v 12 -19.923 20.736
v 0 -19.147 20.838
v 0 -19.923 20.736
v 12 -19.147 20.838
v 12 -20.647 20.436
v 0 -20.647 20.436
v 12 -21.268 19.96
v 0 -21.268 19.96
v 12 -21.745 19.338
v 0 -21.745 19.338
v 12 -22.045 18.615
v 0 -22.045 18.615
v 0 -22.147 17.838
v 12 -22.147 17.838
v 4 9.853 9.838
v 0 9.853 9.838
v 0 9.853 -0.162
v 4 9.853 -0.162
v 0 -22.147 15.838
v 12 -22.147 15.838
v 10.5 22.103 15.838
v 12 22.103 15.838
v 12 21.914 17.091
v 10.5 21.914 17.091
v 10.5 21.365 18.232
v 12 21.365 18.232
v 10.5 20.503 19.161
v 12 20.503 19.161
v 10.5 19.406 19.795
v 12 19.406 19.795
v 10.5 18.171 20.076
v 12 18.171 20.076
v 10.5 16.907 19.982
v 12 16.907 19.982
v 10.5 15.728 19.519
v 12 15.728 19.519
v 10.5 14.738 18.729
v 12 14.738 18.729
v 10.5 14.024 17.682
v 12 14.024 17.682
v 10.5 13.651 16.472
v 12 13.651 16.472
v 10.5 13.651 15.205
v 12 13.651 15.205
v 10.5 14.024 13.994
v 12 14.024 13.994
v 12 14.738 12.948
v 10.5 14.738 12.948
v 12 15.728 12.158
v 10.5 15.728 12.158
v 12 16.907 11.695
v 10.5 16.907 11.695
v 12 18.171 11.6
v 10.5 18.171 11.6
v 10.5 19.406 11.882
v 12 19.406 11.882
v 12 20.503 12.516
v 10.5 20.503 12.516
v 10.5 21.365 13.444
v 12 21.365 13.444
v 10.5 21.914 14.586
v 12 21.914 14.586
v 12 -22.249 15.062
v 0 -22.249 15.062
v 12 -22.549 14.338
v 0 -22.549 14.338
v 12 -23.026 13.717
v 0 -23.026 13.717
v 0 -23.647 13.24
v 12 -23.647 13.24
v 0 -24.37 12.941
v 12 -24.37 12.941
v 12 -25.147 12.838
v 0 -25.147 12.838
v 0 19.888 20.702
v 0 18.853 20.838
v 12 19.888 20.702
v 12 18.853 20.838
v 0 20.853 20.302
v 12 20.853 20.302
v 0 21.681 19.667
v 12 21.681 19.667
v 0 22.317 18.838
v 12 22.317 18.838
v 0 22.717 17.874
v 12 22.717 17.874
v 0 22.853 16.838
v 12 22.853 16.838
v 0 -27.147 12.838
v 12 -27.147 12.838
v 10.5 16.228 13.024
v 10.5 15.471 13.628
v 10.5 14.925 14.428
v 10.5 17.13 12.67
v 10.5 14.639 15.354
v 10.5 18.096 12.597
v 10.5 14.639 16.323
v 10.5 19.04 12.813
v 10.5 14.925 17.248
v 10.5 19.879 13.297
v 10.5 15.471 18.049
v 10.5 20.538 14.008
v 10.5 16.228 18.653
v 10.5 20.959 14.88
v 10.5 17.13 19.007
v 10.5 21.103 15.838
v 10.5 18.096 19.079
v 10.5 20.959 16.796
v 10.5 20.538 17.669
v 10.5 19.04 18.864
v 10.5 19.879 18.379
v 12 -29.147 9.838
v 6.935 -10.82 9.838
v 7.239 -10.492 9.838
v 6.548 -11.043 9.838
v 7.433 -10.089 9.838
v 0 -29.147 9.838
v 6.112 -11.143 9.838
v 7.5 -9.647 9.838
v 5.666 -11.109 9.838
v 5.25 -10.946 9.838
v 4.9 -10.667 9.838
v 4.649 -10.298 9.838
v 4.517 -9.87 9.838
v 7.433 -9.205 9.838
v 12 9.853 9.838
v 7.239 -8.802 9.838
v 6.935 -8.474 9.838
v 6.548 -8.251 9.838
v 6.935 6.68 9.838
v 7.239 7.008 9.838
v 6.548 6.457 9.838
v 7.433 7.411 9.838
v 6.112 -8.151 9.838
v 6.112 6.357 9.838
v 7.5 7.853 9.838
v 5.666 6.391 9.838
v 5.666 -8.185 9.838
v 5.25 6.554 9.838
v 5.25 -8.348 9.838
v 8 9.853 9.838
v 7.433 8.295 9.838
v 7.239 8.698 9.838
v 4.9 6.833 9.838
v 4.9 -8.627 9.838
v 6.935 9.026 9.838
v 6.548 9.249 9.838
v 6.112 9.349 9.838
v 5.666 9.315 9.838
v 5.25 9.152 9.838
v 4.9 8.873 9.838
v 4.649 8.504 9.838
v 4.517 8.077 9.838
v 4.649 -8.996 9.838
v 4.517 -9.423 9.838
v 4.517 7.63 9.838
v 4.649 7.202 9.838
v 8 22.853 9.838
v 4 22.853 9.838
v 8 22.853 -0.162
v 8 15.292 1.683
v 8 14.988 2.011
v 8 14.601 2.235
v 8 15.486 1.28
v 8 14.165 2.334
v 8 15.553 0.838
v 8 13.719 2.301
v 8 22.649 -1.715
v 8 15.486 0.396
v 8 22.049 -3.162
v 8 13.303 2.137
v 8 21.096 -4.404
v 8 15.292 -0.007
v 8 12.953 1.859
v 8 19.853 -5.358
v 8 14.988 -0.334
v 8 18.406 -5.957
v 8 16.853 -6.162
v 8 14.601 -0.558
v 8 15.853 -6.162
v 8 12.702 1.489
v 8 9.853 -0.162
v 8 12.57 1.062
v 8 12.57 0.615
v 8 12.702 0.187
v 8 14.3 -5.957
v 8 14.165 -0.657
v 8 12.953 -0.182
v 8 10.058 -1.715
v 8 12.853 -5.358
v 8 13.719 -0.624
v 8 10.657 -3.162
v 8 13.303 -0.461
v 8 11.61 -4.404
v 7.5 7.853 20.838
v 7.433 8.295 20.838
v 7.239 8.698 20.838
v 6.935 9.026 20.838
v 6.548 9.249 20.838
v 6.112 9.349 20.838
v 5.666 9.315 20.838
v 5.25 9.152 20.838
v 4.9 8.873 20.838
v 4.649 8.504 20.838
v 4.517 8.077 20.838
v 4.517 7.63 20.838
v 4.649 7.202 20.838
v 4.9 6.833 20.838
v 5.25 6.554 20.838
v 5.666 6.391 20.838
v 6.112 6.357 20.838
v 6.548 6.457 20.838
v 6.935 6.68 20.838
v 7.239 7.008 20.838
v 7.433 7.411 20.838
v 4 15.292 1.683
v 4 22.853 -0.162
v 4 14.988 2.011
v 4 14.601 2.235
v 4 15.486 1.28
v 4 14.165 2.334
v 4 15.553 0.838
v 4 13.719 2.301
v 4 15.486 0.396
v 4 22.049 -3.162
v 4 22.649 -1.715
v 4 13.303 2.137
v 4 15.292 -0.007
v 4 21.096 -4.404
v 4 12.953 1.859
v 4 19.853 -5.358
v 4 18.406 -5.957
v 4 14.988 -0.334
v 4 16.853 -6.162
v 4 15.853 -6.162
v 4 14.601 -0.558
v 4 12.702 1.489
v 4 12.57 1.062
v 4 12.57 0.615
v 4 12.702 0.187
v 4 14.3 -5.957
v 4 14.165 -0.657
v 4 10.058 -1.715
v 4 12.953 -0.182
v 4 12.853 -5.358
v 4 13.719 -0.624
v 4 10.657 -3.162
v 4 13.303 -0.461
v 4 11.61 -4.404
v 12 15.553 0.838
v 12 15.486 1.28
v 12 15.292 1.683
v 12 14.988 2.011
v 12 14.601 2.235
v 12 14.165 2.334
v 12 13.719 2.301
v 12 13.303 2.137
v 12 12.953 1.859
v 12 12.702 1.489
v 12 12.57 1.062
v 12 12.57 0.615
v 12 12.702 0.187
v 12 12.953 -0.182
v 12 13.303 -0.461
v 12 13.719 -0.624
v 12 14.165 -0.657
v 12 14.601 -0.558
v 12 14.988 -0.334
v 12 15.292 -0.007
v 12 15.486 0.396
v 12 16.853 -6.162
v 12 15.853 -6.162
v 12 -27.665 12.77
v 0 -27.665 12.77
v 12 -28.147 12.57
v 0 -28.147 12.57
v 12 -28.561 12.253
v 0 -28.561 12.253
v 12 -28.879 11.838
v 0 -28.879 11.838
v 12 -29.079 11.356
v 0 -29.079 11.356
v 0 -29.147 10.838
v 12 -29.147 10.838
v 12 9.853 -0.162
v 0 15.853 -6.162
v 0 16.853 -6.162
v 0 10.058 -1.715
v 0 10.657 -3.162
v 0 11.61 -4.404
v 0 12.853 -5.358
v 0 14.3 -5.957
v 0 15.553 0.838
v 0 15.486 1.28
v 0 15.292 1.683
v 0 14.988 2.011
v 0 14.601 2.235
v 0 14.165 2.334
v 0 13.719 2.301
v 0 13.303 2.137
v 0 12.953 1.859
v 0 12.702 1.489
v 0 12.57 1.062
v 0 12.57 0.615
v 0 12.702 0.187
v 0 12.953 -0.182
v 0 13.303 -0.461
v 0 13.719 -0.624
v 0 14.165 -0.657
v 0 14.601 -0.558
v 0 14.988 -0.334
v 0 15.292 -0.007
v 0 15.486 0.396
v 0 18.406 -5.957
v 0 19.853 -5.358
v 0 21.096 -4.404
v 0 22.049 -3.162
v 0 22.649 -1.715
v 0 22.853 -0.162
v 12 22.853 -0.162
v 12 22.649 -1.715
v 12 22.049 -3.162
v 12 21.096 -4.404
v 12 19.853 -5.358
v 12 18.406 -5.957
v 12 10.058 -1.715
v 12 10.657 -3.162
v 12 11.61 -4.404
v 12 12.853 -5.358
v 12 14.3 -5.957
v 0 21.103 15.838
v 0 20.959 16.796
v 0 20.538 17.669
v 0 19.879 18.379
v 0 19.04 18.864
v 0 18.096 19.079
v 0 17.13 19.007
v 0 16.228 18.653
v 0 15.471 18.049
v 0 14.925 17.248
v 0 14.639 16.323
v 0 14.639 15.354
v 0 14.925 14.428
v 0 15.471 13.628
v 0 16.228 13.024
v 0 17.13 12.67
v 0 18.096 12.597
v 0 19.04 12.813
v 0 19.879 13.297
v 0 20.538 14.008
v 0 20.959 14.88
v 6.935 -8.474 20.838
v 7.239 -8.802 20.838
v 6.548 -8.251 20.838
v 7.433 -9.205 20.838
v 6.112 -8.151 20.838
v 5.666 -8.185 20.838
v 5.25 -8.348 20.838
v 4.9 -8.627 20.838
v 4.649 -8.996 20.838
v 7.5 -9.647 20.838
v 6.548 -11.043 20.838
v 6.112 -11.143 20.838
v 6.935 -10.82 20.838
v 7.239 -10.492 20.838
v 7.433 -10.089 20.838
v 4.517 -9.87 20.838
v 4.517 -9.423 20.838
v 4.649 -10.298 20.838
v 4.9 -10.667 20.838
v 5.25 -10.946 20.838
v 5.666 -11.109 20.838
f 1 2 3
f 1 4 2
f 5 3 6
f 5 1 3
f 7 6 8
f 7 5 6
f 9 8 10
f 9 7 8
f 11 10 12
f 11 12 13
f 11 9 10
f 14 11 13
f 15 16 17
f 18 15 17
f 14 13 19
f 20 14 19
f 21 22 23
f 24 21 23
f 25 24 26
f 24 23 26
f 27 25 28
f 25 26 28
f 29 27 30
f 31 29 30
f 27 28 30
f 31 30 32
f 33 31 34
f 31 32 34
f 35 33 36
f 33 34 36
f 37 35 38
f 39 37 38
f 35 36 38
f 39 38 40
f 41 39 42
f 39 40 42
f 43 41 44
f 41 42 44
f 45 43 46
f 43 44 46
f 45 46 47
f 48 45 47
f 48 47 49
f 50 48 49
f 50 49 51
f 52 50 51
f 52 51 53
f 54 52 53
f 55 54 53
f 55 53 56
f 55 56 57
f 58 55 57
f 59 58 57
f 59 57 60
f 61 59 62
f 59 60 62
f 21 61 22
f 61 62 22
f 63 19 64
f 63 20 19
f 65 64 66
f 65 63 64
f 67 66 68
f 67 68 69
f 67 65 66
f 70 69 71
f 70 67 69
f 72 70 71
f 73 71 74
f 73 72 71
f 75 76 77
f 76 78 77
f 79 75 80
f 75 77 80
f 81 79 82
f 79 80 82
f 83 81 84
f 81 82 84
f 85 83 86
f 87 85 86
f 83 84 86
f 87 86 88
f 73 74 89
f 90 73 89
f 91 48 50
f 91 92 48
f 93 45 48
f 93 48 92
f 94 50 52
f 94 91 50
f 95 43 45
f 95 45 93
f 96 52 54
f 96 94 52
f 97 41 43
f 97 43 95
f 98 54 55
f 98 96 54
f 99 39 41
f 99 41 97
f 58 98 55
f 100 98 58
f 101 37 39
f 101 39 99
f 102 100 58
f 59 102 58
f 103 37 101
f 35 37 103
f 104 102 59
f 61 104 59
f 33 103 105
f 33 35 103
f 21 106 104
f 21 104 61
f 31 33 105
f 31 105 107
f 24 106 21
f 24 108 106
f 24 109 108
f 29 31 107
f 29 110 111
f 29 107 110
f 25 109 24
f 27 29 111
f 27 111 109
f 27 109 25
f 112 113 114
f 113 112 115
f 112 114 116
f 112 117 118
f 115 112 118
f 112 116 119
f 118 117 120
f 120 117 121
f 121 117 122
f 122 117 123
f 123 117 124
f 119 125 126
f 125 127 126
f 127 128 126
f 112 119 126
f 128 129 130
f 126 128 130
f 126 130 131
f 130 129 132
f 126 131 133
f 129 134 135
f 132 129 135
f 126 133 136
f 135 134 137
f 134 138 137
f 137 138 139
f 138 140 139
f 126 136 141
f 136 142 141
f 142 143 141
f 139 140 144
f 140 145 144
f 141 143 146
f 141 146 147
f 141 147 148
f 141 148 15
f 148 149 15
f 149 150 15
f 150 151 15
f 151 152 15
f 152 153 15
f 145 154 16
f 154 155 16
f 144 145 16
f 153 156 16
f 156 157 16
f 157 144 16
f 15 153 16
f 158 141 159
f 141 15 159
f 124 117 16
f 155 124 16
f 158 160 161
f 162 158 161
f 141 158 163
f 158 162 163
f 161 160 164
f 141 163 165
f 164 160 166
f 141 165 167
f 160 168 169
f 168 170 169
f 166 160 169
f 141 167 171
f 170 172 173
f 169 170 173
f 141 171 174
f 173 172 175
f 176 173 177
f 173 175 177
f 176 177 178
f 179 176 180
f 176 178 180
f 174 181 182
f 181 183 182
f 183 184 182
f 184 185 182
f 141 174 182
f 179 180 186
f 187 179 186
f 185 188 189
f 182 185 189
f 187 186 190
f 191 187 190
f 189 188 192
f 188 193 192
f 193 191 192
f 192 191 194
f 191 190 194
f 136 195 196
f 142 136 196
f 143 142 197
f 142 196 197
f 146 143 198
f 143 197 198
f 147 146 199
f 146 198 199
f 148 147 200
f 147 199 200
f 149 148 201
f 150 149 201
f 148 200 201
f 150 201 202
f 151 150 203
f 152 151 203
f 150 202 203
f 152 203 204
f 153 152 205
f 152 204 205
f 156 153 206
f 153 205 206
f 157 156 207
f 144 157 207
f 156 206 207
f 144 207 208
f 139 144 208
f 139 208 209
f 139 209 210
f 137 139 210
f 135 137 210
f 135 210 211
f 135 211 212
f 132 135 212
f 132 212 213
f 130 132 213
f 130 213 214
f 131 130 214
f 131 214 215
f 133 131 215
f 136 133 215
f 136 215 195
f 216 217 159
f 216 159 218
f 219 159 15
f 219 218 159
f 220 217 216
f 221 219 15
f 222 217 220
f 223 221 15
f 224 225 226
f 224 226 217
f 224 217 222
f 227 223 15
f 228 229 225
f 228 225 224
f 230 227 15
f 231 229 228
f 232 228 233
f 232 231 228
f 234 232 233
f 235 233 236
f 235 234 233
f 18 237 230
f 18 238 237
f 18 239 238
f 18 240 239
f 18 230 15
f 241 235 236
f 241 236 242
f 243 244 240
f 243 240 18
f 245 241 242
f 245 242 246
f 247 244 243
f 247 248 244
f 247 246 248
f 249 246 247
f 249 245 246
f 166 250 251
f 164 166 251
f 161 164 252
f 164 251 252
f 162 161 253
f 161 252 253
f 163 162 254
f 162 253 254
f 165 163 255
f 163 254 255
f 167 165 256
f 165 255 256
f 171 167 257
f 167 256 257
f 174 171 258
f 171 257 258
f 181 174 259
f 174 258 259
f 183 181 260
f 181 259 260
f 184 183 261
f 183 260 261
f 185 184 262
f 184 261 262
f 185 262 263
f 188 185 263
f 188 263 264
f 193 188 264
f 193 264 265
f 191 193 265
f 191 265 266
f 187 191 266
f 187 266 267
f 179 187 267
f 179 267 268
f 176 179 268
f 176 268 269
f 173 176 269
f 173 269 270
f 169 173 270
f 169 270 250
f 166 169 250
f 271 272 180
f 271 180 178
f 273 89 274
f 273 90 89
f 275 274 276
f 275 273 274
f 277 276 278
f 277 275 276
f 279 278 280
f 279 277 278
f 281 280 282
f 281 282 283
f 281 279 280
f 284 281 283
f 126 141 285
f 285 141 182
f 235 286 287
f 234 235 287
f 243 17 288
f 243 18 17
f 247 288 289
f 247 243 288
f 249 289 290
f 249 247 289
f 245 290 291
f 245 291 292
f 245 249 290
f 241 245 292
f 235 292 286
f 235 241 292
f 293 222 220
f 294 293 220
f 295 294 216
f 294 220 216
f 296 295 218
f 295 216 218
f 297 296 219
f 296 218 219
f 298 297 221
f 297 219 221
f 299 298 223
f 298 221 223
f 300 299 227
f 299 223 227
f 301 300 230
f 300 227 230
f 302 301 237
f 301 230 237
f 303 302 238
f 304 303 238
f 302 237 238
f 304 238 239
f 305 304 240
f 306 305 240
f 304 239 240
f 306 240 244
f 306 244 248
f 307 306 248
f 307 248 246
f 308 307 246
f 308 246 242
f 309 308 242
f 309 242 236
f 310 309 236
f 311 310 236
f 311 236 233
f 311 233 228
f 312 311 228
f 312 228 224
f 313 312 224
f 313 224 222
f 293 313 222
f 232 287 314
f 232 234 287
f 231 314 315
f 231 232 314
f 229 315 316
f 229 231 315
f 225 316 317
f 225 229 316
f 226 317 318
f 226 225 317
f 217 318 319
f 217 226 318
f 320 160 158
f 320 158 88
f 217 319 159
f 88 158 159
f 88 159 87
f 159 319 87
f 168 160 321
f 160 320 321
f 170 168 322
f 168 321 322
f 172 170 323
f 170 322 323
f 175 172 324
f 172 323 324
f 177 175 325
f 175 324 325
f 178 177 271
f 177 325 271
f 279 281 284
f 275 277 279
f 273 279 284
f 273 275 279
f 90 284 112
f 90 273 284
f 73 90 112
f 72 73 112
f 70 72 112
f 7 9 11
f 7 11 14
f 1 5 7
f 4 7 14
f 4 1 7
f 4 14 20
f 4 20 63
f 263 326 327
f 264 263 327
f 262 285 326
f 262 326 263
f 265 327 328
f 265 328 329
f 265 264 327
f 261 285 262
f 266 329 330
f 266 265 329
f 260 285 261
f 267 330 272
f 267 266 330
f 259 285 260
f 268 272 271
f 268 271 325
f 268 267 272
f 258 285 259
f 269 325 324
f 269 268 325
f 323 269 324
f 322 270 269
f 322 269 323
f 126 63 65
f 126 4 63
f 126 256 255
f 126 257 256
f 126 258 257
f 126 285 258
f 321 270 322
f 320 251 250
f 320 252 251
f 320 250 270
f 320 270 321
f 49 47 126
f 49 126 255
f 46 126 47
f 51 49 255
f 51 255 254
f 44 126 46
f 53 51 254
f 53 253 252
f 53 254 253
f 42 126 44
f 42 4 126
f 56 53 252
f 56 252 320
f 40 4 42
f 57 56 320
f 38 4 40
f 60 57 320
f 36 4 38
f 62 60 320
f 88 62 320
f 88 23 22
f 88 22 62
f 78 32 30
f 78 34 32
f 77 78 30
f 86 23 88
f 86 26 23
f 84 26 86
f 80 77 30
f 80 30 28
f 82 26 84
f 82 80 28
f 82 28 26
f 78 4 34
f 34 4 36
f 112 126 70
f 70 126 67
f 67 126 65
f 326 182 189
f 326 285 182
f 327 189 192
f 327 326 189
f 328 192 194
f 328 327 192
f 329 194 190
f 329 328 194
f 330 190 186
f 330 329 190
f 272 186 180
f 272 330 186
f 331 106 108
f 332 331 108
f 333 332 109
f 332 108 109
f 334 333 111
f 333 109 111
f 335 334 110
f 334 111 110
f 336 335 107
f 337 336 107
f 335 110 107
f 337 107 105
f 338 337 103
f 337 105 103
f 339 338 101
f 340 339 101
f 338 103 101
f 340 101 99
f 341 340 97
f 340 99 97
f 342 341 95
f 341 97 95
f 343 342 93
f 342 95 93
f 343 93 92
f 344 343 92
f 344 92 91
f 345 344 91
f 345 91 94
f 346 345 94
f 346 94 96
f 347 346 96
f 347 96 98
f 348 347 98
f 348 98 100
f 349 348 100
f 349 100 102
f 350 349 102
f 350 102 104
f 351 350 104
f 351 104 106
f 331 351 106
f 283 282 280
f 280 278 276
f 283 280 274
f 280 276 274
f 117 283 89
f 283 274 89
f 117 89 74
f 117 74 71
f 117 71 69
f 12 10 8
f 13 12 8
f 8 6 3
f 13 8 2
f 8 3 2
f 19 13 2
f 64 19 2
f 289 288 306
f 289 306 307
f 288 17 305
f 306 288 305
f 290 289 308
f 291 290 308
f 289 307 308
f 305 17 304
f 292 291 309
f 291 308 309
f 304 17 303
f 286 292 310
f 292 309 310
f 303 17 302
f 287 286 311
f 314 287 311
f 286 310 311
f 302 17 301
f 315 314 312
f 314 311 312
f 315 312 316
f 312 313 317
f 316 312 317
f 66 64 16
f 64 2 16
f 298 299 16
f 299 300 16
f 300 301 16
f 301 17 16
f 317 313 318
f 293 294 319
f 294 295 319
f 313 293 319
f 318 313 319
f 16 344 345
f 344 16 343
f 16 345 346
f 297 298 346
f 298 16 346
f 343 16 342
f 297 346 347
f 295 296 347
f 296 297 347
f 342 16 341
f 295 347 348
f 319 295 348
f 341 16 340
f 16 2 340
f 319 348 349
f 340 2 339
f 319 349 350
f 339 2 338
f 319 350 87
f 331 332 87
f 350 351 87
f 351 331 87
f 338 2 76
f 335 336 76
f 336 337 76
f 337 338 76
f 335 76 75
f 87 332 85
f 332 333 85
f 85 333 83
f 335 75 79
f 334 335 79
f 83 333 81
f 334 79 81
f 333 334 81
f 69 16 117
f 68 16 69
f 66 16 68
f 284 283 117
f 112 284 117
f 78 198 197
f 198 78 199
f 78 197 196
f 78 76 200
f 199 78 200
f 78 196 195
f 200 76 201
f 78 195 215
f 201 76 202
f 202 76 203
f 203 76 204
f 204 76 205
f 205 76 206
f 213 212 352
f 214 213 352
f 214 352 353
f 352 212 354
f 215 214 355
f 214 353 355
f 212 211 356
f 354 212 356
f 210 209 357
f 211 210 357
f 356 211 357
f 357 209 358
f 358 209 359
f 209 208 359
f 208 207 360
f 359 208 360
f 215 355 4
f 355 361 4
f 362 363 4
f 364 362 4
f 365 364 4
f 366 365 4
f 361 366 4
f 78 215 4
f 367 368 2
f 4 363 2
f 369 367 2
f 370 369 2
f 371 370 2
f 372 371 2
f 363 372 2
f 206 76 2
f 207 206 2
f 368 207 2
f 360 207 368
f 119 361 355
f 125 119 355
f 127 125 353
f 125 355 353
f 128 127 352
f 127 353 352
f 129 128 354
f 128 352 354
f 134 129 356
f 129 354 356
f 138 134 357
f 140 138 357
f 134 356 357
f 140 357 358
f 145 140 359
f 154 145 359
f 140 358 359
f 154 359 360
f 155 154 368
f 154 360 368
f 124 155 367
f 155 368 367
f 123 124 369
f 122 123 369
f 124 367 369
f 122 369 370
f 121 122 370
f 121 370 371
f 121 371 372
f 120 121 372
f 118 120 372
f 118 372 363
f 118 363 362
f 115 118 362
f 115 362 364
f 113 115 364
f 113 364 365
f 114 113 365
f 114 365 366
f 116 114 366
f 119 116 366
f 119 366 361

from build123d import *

# Parameters (mm, degrees)
F1_DEPTH  = 12
F2_R      = 3.25
F3_DEPTH  = 12.001
F5_R      = 4.25
F6_DEPTH  = 1.5
F4_R      = 1.5
F7_DEPTH  = 27.001
F8_R      = 4
F9_R      = 3
F10_R     = 2
F11_R     = 1.5
F12_DEPTH = 12.001
F13_W     = 4
F13_H     = 13
F14_DEPTH = 16
F15_R     = 6


with BuildPart() as f1:
    # F0 (on Right) → F1 (new body)
    with BuildSketch(Plane.YZ):
        Polygon((22.85307, 20.83832), (-22.14693, 20.83832), (-22.14693, 12.83832), (-29.14693, 12.83832), (-29.14693, 9.83832), (9.85307, 9.83832), (9.85307, -6.16168), (22.85307, -6.16168), align=None)
    extrude(amount=F1_DEPTH)

    # F2 (on face) → F3 (cut, through all)
    with BuildSketch(Plane.YZ.offset(12)):
        with Locations((17.85307, 15.83832)):
            Circle(F2_R)
    extrude(amount=-F3_DEPTH, mode=Mode.SUBTRACT)

    # F5 (on face) → F6 (cut)
    with BuildSketch(Plane.YZ.offset(12)):
        with Locations((17.85307, 15.83832)):
            Circle(F5_R)
    extrude(amount=-F6_DEPTH, mode=Mode.SUBTRACT)

    # F4 (on face) → F7 (cut, through all)
    with BuildSketch(Plane.XY.offset(20.83832)):
        with Locations((6, 7.85307)):
            Circle(F4_R)
        with Locations((6, -9.64693)):
            Circle(F4_R)
    extrude(amount=-F7_DEPTH, mode=Mode.SUBTRACT)

    # F8
    f8_edges = [f1.edges().sort_by_distance(p)[0] for p in [
        (6, 22.85307, 20.83832),
    ]]
    fillet(f8_edges, radius=F8_R)

    # F9
    f9_edges = [f1.edges().sort_by_distance(p)[0] for p in [
        (6, -22.14693, 20.83832),
        (6, -22.14693, 12.83832),
    ]]
    fillet(f9_edges, radius=F9_R)

    # F10
    f10_edges = [f1.edges().sort_by_distance(p)[0] for p in [
        (6, -29.14693, 12.83832),
    ]]
    fillet(f10_edges, radius=F10_R)

    # F11 (on face) → F12 (cut, through all)
    with BuildSketch(Plane.YZ.offset(12)):
        with Locations((14.05307, 0.83832)):
            Circle(F11_R)
    extrude(amount=-F12_DEPTH, mode=Mode.SUBTRACT)

    # F13 (on face) → F14 (cut)
    with BuildSketch(Plane(origin=(0, 0, -6.16168), x_dir=(1, 0, 0), z_dir=(0, 0, -1))):
        with Locations((6, -16.35307)):
            Rectangle(F13_W, F13_H)
    extrude(amount=-F14_DEPTH, mode=Mode.SUBTRACT)

    # F15
    f15_edges = [f1.edges().sort_by_distance(p)[0] for p in [
        (2, 9.85307, -6.16168),
        (10, 9.85307, -6.16168),
        (2, 22.85307, -6.16168),
        (10, 22.85307, -6.16168),
    ]]
    fillet(f15_edges, radius=F15_R)


solid = f1.part
